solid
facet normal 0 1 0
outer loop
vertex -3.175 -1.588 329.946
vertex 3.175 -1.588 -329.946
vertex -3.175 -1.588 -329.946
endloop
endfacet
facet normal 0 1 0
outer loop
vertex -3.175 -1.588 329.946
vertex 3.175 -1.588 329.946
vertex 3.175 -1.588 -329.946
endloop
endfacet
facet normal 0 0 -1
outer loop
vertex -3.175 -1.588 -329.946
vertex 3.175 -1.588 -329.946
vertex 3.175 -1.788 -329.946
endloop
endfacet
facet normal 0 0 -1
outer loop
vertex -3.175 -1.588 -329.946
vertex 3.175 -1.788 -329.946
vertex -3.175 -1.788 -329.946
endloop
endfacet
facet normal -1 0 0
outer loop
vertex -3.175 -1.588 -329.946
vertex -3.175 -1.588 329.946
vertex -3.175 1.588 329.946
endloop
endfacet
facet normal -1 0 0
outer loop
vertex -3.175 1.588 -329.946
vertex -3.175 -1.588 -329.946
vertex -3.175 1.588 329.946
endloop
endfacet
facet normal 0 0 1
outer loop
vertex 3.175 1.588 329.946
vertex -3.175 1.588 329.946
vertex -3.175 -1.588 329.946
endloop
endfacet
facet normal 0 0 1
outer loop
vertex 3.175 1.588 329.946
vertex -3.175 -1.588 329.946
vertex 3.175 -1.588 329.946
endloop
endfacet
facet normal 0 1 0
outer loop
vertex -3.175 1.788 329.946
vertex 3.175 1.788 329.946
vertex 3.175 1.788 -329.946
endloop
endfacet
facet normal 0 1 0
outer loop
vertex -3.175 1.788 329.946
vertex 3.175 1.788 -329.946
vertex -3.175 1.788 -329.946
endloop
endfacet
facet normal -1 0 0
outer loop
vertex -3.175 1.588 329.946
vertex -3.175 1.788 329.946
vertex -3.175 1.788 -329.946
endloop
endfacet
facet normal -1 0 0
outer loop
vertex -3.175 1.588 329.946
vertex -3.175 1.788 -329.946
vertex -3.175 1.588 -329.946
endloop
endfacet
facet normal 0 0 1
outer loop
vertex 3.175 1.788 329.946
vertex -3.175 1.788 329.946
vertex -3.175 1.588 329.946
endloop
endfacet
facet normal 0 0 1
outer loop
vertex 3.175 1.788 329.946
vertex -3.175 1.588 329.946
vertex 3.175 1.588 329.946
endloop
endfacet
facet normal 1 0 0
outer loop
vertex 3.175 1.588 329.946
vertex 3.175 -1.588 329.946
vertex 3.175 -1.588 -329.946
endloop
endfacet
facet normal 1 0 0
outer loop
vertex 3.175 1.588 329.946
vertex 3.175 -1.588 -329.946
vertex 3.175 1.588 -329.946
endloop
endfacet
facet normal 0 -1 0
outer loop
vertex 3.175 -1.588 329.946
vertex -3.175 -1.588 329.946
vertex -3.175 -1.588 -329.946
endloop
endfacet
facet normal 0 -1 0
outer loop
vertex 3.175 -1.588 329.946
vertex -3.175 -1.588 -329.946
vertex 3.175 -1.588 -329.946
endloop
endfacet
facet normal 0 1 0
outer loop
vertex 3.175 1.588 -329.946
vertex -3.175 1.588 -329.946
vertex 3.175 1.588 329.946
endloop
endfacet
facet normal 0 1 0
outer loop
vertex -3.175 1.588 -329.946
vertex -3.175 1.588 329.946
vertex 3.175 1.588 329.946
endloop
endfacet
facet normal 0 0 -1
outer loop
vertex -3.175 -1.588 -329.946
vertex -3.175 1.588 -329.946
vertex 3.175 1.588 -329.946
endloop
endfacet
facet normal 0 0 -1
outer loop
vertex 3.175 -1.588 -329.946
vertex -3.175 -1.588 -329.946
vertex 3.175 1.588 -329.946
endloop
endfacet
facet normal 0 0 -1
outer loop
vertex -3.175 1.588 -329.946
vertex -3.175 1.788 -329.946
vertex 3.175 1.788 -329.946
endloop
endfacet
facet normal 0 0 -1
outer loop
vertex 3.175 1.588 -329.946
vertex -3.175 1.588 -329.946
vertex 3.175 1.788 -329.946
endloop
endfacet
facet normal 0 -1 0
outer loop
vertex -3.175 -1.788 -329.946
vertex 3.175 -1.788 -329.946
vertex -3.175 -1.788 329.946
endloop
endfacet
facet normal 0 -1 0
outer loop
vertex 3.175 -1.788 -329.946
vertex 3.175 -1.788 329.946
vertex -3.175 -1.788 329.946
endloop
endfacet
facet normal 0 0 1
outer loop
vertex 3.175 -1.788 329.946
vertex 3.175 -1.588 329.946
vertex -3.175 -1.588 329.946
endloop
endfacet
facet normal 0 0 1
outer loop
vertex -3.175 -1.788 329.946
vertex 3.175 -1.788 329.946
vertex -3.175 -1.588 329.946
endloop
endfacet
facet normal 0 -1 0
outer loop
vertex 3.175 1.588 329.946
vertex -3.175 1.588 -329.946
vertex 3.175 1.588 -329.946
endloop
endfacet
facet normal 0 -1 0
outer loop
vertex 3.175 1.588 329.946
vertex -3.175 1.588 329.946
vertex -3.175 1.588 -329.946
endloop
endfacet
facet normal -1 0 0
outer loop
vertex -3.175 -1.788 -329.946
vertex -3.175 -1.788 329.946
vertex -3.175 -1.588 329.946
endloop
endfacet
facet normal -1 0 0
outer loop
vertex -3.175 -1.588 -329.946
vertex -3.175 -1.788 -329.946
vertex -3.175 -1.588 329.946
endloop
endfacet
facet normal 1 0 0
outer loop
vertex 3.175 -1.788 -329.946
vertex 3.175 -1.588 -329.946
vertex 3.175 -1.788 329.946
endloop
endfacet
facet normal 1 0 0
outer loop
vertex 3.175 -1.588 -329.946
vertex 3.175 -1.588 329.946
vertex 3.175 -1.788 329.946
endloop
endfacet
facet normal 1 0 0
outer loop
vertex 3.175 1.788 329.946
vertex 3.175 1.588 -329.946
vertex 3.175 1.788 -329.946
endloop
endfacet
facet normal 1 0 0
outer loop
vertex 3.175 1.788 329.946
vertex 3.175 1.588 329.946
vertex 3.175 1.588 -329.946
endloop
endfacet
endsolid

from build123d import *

# Parameters (mm, degrees)
CORE_SKETCH_W  = 6.35
CORE_SKETCH_H  = 3.175
CORE_DEPTH     = 329.946
FLANGE_DEPTH   = 329.946
FLANGE_2_DEPTH = 329.946


with BuildPart() as part:
    # Core Sketch → Core (new, symmetric)
    with BuildSketch(Plane.XY):
        Rectangle(CORE_SKETCH_W, CORE_SKETCH_H)
    extrude(amount=CORE_DEPTH, both=True)


with BuildPart() as body_2:
    # Flange Sketch → Flange (new, symmetric)
    with BuildSketch(Plane.XY):
        Polygon((0, 1.5875), (3.175, 1.5875), (3.175, 1.787500108), (-3.175, 1.787500108), (-3.175, 1.5875), align=None)
    extrude(amount=FLANGE_DEPTH, both=True)


with BuildPart() as body_3:
    # Flange Sketch → Flange 2 (new, symmetric)
    with BuildSketch(Plane.XY):
        Polygon((0, -1.5875), (3.175, -1.5875), (3.175, -1.787500108), (-3.175, -1.787500108), (-3.175, -1.5875), align=None)
    extrude(amount=FLANGE_2_DEPTH, both=True)


solid = Compound([part.part, body_2.part, body_3.part])
